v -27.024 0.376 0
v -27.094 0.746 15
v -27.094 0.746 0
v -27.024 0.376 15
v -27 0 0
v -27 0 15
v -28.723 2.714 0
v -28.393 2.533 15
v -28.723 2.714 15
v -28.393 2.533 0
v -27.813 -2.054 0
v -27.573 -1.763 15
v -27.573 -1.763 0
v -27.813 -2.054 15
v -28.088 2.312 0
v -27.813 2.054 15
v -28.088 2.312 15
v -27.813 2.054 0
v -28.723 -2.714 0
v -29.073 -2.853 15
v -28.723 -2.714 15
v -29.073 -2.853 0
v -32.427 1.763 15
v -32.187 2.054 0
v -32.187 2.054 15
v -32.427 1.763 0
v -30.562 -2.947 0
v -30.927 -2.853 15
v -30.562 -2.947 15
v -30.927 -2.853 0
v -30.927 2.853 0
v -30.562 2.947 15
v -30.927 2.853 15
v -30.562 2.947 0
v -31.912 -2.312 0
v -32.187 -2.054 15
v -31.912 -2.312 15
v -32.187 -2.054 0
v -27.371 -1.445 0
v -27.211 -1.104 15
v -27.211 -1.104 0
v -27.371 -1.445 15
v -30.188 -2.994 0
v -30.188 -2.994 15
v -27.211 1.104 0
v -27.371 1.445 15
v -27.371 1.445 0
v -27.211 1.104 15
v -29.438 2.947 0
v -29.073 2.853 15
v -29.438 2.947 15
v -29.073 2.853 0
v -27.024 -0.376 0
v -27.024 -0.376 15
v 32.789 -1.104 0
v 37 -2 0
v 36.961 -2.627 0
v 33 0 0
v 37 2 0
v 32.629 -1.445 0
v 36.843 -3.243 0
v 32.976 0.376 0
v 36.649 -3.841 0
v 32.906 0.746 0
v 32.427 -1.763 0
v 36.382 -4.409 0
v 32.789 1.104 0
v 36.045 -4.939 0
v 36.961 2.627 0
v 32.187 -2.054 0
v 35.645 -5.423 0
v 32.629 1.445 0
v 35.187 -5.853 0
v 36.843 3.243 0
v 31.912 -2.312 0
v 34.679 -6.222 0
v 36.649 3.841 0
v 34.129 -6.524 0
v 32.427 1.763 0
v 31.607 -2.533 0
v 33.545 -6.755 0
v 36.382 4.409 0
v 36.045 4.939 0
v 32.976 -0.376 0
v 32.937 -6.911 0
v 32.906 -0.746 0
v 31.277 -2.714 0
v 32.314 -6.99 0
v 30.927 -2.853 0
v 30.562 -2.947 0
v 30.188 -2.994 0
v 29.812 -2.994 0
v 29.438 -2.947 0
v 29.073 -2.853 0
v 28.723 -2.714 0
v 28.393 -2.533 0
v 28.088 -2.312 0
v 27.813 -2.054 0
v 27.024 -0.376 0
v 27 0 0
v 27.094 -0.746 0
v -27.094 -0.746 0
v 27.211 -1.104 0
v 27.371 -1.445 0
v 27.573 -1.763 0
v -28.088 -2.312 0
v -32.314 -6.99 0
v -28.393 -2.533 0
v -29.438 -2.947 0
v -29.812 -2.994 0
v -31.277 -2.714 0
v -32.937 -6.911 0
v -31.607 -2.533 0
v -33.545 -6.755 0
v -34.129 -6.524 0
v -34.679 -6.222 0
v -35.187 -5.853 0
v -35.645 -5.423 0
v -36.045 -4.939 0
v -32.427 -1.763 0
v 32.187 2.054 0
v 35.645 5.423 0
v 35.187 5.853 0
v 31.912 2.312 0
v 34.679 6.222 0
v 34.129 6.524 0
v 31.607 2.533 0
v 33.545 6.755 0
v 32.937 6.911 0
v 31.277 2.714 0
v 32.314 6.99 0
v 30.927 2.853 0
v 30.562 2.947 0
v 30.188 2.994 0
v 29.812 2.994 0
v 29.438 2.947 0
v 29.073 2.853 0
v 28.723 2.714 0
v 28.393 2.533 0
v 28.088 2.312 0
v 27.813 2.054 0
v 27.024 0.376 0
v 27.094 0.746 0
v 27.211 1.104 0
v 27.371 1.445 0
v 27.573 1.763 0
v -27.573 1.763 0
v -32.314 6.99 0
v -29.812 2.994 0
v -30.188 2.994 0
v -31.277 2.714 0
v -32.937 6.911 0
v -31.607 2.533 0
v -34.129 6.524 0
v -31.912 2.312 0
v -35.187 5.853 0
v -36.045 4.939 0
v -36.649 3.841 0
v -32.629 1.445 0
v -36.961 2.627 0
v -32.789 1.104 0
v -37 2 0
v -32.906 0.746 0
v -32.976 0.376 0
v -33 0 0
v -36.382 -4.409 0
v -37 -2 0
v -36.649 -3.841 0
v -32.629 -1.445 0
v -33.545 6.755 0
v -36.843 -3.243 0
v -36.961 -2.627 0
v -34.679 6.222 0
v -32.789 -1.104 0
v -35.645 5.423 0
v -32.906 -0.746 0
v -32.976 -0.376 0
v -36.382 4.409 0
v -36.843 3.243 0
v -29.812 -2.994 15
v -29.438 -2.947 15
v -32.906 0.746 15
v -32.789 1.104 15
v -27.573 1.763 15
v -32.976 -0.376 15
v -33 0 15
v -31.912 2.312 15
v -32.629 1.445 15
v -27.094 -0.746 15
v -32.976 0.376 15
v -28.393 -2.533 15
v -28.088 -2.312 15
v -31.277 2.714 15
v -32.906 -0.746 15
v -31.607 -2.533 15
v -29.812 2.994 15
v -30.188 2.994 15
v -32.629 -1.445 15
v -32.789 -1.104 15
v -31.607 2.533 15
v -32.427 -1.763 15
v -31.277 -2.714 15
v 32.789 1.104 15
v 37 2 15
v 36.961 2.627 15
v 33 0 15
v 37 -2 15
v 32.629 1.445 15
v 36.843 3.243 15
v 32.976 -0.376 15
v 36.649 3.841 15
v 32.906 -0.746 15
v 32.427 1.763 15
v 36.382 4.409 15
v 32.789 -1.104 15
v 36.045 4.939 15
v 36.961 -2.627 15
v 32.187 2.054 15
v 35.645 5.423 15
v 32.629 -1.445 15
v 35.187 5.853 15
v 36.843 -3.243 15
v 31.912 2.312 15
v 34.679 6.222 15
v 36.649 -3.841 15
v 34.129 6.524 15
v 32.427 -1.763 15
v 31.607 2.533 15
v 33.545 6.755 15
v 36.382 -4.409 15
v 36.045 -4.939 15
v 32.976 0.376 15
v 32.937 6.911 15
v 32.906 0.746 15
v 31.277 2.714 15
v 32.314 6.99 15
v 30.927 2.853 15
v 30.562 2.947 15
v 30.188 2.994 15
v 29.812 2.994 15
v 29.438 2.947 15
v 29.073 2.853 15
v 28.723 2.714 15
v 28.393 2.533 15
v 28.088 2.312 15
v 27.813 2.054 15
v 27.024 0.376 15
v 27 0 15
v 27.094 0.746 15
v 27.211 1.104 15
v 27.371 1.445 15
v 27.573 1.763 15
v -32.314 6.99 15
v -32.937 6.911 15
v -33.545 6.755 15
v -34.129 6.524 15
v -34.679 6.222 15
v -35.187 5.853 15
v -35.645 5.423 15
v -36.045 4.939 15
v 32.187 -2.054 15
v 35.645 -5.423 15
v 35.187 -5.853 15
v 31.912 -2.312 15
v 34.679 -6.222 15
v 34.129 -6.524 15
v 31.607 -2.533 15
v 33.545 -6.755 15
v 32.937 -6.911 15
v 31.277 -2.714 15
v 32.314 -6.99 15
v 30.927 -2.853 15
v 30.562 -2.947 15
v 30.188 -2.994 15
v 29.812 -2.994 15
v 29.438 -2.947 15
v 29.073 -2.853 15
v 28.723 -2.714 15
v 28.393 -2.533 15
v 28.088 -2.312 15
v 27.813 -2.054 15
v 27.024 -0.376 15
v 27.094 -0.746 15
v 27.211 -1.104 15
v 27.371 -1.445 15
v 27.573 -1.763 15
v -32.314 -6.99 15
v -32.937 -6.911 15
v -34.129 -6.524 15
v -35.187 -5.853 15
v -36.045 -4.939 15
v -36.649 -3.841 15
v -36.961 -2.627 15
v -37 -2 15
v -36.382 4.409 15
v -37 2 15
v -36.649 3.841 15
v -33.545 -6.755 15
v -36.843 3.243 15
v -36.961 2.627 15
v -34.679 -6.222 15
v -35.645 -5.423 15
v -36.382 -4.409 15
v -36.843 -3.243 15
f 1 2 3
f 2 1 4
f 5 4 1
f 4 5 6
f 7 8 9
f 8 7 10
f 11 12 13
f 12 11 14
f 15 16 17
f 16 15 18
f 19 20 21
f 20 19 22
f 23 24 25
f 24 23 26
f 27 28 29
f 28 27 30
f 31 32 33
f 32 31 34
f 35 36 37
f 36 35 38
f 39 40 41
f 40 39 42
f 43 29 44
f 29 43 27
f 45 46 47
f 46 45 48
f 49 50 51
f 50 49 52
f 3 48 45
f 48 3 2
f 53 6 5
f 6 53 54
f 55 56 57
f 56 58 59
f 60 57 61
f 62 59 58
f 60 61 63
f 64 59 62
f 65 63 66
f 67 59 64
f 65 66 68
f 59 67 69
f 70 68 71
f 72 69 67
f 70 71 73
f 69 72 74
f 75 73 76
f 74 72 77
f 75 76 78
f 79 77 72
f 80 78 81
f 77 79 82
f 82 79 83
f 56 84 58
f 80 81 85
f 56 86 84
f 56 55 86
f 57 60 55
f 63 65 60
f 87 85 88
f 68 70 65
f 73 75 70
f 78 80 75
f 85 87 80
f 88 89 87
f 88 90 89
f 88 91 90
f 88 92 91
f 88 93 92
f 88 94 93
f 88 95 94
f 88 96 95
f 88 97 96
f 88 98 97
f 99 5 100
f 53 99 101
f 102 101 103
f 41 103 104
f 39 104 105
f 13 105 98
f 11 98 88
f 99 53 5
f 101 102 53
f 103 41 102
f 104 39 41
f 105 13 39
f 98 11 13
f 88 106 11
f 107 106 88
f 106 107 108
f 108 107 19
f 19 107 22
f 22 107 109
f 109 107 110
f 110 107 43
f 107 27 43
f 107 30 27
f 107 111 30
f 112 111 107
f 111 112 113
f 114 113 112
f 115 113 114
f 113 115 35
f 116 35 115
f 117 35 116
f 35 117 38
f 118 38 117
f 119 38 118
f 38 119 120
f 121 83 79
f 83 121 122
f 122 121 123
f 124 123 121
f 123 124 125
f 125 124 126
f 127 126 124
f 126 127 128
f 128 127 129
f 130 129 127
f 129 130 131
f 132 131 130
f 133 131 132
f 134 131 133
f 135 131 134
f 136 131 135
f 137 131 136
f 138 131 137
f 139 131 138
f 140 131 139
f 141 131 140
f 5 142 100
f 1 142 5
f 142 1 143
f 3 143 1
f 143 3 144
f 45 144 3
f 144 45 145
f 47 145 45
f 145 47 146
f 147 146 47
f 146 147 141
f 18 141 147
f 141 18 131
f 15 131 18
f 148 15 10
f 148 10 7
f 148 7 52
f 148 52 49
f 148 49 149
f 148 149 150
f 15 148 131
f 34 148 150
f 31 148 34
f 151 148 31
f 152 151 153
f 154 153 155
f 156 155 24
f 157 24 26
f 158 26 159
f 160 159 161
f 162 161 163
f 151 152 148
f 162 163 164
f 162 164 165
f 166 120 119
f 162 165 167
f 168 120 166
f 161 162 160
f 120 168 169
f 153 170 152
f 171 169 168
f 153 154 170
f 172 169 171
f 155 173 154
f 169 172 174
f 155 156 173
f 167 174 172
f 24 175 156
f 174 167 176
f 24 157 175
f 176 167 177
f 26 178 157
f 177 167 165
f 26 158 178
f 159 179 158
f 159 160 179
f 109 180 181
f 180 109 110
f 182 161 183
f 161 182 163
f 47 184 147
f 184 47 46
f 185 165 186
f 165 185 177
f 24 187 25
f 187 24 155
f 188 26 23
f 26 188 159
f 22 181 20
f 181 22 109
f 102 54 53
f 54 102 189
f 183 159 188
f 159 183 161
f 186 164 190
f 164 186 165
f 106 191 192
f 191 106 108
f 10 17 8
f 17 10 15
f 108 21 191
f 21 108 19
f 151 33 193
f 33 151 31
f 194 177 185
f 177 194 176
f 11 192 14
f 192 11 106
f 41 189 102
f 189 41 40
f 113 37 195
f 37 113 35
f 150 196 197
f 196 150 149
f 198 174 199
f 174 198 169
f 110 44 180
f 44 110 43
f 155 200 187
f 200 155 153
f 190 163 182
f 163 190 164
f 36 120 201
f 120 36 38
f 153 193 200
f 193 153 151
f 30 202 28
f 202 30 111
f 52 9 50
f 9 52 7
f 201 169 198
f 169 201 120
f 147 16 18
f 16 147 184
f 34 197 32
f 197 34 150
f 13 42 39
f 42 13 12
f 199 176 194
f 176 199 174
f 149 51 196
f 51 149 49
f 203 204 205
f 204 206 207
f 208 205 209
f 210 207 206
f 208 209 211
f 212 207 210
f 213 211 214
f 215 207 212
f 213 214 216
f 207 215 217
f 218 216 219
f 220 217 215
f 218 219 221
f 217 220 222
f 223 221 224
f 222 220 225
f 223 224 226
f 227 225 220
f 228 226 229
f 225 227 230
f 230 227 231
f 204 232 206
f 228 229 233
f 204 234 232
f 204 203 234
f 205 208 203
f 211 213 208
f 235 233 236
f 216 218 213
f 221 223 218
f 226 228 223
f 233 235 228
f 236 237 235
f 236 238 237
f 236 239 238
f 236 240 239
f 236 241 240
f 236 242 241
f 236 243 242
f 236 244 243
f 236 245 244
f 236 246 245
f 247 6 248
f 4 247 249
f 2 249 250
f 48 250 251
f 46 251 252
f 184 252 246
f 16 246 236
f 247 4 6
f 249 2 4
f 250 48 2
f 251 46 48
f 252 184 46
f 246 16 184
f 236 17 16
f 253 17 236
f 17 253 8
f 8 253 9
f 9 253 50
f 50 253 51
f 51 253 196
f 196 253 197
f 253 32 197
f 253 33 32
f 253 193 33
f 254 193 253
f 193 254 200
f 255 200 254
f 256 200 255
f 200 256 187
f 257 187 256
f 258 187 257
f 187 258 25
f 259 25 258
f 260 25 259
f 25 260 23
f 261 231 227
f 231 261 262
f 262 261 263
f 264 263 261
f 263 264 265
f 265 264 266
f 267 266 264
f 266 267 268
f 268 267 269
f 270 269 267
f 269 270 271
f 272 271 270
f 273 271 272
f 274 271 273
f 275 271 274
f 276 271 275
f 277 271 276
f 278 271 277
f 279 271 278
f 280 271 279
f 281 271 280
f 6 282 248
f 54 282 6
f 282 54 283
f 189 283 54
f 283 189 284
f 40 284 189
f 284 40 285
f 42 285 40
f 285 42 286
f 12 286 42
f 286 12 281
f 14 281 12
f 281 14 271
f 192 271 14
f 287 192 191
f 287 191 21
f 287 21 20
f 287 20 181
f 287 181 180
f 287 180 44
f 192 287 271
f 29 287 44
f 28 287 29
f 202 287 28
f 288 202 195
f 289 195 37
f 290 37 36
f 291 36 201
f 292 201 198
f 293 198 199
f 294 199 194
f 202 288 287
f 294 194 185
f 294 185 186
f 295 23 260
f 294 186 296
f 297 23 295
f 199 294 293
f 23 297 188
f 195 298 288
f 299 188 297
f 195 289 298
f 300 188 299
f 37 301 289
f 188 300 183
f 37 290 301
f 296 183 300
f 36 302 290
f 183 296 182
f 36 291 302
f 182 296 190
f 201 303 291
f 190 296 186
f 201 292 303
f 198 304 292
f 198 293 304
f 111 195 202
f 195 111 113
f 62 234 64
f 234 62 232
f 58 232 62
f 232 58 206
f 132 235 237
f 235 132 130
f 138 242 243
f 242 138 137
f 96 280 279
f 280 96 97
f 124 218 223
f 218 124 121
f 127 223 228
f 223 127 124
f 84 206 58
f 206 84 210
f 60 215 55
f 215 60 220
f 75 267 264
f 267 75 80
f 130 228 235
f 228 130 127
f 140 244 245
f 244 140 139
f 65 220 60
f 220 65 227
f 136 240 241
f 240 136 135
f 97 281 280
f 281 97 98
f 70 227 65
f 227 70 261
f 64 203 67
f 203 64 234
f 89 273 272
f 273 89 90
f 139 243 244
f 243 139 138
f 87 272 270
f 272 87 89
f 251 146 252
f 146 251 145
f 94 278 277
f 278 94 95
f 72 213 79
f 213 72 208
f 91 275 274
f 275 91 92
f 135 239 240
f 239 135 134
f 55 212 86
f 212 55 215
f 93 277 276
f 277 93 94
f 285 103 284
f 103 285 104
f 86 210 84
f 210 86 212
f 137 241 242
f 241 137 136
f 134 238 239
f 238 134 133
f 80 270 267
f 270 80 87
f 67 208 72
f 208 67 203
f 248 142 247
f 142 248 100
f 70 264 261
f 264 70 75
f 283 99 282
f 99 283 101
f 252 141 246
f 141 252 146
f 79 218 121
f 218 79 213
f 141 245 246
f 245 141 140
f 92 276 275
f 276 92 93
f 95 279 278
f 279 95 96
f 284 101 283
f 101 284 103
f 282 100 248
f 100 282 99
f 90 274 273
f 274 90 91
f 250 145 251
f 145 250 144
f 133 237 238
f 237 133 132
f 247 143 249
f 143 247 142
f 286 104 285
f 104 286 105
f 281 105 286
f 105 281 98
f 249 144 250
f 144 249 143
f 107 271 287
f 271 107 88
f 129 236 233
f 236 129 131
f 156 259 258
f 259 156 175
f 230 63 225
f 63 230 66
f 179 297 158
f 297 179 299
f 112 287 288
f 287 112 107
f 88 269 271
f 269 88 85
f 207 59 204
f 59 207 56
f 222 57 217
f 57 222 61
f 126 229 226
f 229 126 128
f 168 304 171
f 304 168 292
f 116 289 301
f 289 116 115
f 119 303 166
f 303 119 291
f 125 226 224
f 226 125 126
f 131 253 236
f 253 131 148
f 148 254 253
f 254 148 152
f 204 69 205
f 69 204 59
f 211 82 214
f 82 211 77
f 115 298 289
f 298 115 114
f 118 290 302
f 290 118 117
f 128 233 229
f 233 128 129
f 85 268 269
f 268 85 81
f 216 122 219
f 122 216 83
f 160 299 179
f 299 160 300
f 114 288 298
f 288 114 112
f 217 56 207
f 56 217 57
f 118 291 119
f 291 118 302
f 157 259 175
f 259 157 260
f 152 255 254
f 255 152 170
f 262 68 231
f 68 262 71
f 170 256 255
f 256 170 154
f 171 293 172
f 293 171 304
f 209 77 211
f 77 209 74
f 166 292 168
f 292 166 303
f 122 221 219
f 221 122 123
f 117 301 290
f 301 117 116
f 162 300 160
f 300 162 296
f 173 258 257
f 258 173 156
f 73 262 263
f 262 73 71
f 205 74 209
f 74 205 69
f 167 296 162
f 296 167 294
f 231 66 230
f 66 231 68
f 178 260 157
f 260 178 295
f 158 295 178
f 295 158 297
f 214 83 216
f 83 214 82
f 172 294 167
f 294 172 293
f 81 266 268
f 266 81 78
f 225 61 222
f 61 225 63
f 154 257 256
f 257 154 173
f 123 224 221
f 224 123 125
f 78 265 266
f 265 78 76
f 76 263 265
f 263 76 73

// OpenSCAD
$fn = 50;


difference() {
	union() {
		hull() {
			translate(v = [-32.0000000000, 2.0000000000, 0]) {
				cylinder(h = 15, r = 5);
			}
			translate(v = [32.0000000000, 2.0000000000, 0]) {
				cylinder(h = 15, r = 5);
			}
			translate(v = [-32.0000000000, -2.0000000000, 0]) {
				cylinder(h = 15, r = 5);
			}
			translate(v = [32.0000000000, -2.0000000000, 0]) {
				cylinder(h = 15, r = 5);
			}
		}
	}
	union() {
		translate(v = [-30.0000000000, 0.0000000000, 0]) {
			cylinder(h = 15, r = 3.0000000000);
		}
		translate(v = [30.0000000000, 0.0000000000, 0]) {
			cylinder(h = 15, r = 3.0000000000);
		}
		translate(v = [-30.0000000000, 0.0000000000, 0]) {
			cylinder(h = 15, r = 1.5000000000);
		}
		translate(v = [30.0000000000, 0.0000000000, 0]) {
			cylinder(h = 15, r = 1.5000000000);
		}
		translate(v = [-30.0000000000, 0.0000000000, 0]) {
			cylinder(h = 15, r = 1.5000000000);
		}
		translate(v = [30.0000000000, 0.0000000000, 0]) {
			cylinder(h = 15, r = 1.5000000000);
		}
		translate(v = [-30.0000000000, 0.0000000000, 0]) {
			cylinder(h = 15, r = 1.5000000000);
		}
		translate(v = [30.0000000000, 0.0000000000, 0]) {
			cylinder(h = 15, r = 1.5000000000);
		}
	}
}
